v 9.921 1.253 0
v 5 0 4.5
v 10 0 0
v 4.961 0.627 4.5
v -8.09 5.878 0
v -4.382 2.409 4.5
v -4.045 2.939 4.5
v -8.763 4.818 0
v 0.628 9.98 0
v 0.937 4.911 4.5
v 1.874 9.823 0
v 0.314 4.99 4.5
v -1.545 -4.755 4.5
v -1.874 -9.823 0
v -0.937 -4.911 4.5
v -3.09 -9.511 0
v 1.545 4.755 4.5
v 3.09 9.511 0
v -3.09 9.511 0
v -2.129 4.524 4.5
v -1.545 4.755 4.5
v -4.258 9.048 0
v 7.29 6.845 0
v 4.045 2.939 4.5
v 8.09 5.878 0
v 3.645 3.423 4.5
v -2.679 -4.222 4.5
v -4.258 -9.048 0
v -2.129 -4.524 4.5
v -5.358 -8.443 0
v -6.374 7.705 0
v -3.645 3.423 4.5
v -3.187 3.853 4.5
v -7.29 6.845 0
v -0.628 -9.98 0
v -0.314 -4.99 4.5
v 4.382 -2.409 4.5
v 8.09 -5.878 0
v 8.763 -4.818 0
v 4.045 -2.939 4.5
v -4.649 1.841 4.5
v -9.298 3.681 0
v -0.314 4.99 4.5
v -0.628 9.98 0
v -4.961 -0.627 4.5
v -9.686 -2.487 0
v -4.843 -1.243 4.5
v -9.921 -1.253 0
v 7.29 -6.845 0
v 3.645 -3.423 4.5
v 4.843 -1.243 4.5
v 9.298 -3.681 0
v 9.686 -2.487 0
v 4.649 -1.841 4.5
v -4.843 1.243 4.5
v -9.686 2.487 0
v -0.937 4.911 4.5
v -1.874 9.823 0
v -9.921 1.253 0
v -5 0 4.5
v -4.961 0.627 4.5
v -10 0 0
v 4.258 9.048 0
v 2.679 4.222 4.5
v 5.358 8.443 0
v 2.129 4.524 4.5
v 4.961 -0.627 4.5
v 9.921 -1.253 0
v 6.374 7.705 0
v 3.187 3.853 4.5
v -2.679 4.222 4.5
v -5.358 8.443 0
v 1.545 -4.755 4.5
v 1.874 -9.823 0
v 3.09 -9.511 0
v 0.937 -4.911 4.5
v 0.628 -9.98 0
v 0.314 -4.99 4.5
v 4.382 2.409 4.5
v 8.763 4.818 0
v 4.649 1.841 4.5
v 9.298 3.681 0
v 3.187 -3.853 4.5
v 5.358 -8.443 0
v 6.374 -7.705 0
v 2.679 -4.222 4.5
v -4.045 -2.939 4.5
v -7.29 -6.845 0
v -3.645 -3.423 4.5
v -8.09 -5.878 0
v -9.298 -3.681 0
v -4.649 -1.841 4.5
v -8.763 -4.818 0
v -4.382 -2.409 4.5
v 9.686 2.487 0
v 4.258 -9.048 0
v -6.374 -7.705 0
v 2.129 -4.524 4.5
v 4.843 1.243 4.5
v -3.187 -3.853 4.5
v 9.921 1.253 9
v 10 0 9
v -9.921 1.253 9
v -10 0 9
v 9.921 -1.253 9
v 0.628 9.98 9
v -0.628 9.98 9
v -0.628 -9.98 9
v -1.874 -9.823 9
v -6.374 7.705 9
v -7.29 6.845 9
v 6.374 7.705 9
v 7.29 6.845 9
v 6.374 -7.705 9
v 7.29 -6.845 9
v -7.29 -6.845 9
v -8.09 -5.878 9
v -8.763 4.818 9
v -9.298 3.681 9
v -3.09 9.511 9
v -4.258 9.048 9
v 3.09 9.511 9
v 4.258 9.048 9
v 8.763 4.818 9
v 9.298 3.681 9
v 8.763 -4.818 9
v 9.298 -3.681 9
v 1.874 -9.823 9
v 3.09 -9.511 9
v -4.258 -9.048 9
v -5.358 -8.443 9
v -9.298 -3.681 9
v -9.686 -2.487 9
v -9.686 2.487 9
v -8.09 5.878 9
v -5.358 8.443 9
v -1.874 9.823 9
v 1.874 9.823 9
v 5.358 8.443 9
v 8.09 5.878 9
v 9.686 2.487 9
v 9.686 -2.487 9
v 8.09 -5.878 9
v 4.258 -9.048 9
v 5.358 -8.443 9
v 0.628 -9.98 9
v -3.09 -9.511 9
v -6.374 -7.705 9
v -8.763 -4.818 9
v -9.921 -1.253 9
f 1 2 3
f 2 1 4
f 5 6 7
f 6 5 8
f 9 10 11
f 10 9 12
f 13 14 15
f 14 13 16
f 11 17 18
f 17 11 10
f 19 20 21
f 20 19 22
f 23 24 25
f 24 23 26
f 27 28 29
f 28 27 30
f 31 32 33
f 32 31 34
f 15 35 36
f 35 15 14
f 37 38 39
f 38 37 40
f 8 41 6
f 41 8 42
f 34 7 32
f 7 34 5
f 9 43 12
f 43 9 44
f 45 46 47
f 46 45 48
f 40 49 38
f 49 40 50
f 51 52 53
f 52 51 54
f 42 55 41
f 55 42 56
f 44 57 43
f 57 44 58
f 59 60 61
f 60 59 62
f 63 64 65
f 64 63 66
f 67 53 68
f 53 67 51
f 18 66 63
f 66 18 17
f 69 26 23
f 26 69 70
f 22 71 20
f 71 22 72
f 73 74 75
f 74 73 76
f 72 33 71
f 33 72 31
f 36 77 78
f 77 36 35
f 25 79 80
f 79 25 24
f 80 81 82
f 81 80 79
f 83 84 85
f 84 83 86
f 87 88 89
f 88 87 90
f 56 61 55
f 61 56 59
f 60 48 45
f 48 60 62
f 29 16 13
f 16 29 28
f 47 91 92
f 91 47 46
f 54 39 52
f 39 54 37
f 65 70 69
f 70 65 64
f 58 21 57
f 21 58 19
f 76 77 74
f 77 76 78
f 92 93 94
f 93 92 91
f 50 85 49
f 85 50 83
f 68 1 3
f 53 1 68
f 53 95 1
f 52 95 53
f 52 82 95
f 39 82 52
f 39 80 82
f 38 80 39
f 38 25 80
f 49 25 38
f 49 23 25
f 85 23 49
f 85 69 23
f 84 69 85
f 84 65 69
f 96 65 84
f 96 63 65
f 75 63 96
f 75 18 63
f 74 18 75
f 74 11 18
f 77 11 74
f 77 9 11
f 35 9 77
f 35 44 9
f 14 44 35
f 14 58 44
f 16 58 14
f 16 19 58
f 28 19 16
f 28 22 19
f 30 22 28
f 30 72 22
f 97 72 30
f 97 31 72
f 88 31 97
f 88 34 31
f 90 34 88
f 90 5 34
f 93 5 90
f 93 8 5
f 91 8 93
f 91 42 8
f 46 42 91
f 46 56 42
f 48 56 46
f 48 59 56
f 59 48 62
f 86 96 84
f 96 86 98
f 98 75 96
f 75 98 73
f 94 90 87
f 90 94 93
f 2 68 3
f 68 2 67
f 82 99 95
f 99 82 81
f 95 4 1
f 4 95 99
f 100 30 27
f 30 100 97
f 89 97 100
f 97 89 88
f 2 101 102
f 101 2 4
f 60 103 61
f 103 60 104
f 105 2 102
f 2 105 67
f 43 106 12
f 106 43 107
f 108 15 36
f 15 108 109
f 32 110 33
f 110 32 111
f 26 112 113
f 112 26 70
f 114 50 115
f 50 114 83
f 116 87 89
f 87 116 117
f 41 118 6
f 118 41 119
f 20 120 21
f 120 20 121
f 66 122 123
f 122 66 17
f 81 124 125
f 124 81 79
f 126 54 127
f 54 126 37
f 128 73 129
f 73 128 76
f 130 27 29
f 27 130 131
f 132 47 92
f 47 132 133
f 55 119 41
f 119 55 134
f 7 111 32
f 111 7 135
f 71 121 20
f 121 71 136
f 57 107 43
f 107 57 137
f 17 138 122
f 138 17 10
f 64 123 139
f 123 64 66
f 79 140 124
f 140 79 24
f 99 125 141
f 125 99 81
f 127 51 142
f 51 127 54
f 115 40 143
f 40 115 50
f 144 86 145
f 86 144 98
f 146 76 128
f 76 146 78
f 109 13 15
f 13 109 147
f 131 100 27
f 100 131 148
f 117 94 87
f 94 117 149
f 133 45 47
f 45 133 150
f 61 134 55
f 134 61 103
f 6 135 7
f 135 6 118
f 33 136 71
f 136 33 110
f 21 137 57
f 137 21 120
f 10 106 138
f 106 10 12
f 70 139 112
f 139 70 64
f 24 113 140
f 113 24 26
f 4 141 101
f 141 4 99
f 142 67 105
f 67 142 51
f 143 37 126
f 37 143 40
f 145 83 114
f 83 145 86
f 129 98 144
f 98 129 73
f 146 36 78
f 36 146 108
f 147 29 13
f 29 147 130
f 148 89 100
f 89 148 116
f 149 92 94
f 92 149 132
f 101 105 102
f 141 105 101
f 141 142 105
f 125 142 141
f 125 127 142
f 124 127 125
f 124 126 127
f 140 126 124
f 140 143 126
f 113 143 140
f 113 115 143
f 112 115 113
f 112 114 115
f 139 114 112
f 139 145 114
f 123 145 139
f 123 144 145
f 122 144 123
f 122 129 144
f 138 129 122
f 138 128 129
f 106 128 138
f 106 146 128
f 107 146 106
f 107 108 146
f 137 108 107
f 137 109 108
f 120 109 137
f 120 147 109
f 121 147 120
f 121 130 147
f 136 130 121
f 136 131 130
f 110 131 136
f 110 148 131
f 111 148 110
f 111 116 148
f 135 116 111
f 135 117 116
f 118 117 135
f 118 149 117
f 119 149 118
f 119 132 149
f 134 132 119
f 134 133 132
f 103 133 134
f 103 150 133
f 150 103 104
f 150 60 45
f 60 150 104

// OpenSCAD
union() {
	$fn=50;
	$height=9;
	$diameter=20;
	union() {
		cylinder(h=$height, d1=$diameter, d2=0);
		cylinder(h=$height, d1=0, d2=$diameter);
	}
}
